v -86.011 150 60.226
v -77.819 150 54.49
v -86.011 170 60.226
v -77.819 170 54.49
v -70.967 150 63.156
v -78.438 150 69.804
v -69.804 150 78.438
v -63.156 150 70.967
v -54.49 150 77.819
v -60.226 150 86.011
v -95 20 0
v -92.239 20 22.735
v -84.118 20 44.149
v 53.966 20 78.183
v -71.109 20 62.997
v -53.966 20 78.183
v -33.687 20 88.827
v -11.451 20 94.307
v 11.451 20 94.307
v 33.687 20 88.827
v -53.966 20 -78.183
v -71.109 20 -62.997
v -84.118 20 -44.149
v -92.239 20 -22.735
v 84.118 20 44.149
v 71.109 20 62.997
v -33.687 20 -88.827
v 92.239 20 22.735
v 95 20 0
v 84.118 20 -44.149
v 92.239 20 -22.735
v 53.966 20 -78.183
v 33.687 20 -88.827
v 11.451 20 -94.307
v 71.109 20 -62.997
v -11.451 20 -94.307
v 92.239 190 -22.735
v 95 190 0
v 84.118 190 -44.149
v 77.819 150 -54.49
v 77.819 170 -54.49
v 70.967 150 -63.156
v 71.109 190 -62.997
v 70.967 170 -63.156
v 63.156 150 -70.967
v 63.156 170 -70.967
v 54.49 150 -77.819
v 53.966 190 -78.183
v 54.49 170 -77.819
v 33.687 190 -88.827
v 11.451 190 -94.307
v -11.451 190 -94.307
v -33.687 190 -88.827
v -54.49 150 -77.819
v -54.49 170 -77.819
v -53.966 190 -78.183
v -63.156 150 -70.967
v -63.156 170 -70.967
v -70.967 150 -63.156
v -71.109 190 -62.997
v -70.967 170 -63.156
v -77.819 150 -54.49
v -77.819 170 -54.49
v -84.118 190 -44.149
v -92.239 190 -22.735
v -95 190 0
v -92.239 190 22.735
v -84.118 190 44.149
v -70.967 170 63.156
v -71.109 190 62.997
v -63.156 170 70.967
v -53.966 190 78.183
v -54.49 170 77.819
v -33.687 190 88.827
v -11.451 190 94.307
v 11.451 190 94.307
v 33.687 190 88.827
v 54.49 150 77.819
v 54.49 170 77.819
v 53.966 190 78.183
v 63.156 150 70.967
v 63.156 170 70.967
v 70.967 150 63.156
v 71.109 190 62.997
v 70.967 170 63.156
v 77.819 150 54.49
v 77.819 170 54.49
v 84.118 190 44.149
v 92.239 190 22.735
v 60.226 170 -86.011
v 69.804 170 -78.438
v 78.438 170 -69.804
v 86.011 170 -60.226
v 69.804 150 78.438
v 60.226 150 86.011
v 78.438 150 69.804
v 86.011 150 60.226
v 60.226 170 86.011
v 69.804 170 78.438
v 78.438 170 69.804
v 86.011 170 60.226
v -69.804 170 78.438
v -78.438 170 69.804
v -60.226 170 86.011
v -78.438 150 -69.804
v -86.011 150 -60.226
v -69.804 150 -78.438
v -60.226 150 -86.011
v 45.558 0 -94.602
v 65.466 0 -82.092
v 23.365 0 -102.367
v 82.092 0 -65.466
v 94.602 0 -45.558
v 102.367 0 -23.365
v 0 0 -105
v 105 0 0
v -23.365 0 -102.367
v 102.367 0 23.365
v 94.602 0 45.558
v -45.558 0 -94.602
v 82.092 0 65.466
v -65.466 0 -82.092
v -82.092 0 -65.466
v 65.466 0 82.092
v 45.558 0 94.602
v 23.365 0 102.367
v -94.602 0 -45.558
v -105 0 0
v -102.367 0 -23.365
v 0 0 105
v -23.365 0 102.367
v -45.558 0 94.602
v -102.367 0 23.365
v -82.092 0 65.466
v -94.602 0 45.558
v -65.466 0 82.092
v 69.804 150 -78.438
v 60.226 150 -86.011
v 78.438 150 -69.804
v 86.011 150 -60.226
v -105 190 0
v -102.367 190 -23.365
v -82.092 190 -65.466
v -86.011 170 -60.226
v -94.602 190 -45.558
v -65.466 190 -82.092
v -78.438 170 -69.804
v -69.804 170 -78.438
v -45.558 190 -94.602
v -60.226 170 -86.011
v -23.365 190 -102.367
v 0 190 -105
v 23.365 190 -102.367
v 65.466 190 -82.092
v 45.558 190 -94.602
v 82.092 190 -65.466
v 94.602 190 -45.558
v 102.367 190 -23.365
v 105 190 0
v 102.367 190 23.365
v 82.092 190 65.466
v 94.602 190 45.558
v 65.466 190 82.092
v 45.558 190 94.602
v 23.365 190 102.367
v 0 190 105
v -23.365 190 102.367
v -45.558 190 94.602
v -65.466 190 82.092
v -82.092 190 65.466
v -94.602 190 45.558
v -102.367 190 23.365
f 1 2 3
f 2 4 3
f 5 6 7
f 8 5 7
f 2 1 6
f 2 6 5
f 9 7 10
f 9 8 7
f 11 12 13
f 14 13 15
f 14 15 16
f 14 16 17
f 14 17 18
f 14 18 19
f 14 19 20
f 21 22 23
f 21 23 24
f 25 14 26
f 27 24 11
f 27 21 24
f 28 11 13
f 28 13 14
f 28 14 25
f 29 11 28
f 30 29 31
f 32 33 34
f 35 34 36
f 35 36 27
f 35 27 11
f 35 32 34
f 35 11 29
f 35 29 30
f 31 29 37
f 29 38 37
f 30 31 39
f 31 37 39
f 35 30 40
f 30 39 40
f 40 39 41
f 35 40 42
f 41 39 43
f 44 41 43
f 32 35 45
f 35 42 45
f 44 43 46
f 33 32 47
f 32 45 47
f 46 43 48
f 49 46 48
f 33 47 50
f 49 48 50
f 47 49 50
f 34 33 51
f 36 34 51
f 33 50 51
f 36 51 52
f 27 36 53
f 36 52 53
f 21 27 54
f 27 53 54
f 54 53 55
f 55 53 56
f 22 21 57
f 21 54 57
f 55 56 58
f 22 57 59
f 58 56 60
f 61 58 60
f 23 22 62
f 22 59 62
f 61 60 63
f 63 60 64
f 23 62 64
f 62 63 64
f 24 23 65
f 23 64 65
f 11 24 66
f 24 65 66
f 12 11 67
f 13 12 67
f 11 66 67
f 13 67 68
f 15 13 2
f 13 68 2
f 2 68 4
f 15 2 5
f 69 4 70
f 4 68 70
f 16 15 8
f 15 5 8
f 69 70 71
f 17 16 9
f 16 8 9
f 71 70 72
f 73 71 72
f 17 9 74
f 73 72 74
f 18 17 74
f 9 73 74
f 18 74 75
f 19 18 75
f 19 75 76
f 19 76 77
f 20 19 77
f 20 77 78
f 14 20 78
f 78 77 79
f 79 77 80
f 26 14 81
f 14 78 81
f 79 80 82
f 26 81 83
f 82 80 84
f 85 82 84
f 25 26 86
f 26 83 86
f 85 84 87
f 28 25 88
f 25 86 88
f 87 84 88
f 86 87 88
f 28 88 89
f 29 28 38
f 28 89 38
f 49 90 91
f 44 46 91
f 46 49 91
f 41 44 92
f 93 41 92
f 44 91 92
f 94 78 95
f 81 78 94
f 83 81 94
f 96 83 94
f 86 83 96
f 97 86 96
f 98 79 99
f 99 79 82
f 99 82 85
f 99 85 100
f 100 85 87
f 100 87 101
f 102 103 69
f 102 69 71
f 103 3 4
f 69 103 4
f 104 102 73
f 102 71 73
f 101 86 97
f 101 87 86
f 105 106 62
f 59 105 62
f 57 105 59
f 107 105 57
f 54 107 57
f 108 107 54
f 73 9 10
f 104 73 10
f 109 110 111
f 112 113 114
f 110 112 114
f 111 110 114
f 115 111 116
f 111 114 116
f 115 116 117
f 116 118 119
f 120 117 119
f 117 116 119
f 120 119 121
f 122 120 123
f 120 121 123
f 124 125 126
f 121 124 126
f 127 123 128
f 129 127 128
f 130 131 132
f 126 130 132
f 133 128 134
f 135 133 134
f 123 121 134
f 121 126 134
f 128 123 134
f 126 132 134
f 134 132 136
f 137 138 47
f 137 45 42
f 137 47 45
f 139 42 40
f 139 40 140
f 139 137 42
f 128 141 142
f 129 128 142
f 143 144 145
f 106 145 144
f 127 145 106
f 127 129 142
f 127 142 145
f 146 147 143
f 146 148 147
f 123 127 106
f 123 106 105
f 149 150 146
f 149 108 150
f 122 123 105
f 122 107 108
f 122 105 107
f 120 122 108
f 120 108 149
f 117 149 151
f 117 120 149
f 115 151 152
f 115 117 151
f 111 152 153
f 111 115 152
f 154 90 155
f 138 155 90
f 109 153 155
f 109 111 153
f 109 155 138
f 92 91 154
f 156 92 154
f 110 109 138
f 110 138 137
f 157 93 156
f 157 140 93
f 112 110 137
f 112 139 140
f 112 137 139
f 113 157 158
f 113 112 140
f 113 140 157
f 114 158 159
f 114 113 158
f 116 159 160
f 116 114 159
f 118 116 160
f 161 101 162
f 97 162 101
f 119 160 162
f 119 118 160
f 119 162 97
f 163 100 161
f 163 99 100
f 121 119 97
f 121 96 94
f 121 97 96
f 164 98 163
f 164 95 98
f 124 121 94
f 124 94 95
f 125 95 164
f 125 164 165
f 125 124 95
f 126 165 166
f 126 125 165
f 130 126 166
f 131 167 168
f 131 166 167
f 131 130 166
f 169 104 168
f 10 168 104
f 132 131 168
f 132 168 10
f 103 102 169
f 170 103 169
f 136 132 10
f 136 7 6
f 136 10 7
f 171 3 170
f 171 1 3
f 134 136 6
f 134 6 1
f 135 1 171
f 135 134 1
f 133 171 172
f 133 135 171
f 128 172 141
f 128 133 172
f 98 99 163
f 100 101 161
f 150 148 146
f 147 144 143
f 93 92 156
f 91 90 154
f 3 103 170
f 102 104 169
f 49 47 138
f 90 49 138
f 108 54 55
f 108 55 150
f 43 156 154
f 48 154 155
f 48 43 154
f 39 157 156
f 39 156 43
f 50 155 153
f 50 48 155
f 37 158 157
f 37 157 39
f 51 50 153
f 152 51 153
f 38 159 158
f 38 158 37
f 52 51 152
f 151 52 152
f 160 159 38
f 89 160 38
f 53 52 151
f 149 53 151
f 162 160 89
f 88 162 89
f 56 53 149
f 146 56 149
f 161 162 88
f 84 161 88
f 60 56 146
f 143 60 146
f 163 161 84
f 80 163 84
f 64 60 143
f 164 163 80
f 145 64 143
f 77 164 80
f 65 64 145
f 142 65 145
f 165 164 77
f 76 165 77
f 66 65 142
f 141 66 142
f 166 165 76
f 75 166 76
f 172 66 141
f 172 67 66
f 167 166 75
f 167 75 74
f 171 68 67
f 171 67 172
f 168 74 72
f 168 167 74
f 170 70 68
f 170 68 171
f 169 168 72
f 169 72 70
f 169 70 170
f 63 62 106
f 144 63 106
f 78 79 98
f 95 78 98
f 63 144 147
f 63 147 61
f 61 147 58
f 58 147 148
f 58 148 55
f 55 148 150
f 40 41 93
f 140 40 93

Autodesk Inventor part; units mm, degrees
ref_plane "YZ Plane" through (0, 0, 0) normal (1, 0, 0) x (0, 1, 0)
ref_plane "XZ Plane" through (0, 0, 0) normal (0, 1, 0) x (-1, 0, 0)
sketch "Sketch1" plane through (0, 0, 0) normal (0, 1, 0) x (-1, 0, 0)
  circle A0 centre (0, 0) radius 105
  dimension "d0" = 210
extrude "Extrusion1" add sketch "Sketch1" along normal blind 190
sketch "Sketch2" plane through (0, 190, 0) normal (0, 1, 0) x (1, 0, 0)
  circle A0 centre (0, 0) radius 95
  dimension "d3" = 190
extrude "Extrusion2" cut sketch "Sketch2" against normal blind 170
ref_plane "Work Plane1" through (0, 170, 0) normal (0, 1, 0) x (1, 0, 0)
sketch "Sketch3" plane through (0, 170, 0) normal (0, 1, 0) x (1, 0, 0)
  circle A0 centre (0, 0) radius 95 projected
  line L0 (0, 0) -> (20.2008, 0) construction
  line L1 (0, 0) -> (20.2008, 0) construction
  circle A1 centre (0, 0) radius 105 projected
  line L2 (0, 0) -> (10.5, 0) construction
  line L3 (5.449, 7.7819) -> (60.2255, 86.011)
  line L4 (0, 0) -> (10.5, 0) construction
  line L5 (7.7819, 5.449) -> (86.011, 60.2255)
  line L6 (0, 0) -> (10.5, 0) construction
  line L7 (5.449, -7.7819) -> (60.2255, -86.011)
  line L8 (0, 0) -> (10.5, 0) construction
  line L9 (7.7819, -5.449) -> (86.011, -60.2255)
  line L10 (0, 0) -> (10.5, 0) construction
  line L11 (-5.449, 7.7819) -> (-60.2255, 86.011)
  line L12 (0, 0) -> (10.5, 0) construction
  line L13 (-7.7819, 5.449) -> (-86.011, 60.2255)
  line L14 (0, 0) -> (10.5, 0) construction
  line L15 (0, 0) -> (10.5, 0) construction
  line L16 (0, 0) -> (10.5, 0) construction
  line L17 (-5.449, -7.7819) -> (-60.2255, -86.011)
  line L18 (-7.7819, -5.449) -> (-86.011, -60.2255)
  arc A2 (7.7819, 5.449) -> (5.449, 7.7819) centre (0, 0) ccw
  arc A3 (5.449, -7.7819) -> (7.7819, -5.449) centre (0, 0) ccw
  arc A4 (-5.449, 7.7819) -> (-7.7819, 5.449) centre (0, 0) ccw
  arc A5 (-7.7819, -5.449) -> (-5.449, -7.7819) centre (0, 0) ccw
  arc A6 (-60.2255, 86.011) -> (-86.011, 60.2255) centre (0, 0) ccw
  arc A7 (86.011, 60.2255) -> (60.2255, 86.011) centre (0, 0) ccw
  arc A8 (-86.011, -60.2255) -> (-60.2255, -86.011) centre (0, 0) ccw
  arc A9 (60.2255, -86.011) -> (86.011, -60.2255) centre (0, 0) ccw
  point P0 (-77.8194, 54.4898)
  point P1 (-54.4898, 77.8194)
  point P2 (77.8194, -54.4898)
  point P3 (54.4898, -77.8194)
  point P4 (77.8194, 54.4898)
  point P5 (54.4898, 77.8194)
  point P6 (-77.8194, -54.4898)
  point P7 (-54.4898, -77.8194)
  dimension "d22" = 55
  dimension "d23" = 35
  dimension "d24" = 55
  dimension "d26" = 125
  dimension "d27" = 145
extrude "Extrusion3" cut sketch "Sketch3" against normal blind 20 contours A0 L3 A1 L5 | L9 A1 L7 A0 | A0 L13 A1 L11 | L17 A1 L18 A0
